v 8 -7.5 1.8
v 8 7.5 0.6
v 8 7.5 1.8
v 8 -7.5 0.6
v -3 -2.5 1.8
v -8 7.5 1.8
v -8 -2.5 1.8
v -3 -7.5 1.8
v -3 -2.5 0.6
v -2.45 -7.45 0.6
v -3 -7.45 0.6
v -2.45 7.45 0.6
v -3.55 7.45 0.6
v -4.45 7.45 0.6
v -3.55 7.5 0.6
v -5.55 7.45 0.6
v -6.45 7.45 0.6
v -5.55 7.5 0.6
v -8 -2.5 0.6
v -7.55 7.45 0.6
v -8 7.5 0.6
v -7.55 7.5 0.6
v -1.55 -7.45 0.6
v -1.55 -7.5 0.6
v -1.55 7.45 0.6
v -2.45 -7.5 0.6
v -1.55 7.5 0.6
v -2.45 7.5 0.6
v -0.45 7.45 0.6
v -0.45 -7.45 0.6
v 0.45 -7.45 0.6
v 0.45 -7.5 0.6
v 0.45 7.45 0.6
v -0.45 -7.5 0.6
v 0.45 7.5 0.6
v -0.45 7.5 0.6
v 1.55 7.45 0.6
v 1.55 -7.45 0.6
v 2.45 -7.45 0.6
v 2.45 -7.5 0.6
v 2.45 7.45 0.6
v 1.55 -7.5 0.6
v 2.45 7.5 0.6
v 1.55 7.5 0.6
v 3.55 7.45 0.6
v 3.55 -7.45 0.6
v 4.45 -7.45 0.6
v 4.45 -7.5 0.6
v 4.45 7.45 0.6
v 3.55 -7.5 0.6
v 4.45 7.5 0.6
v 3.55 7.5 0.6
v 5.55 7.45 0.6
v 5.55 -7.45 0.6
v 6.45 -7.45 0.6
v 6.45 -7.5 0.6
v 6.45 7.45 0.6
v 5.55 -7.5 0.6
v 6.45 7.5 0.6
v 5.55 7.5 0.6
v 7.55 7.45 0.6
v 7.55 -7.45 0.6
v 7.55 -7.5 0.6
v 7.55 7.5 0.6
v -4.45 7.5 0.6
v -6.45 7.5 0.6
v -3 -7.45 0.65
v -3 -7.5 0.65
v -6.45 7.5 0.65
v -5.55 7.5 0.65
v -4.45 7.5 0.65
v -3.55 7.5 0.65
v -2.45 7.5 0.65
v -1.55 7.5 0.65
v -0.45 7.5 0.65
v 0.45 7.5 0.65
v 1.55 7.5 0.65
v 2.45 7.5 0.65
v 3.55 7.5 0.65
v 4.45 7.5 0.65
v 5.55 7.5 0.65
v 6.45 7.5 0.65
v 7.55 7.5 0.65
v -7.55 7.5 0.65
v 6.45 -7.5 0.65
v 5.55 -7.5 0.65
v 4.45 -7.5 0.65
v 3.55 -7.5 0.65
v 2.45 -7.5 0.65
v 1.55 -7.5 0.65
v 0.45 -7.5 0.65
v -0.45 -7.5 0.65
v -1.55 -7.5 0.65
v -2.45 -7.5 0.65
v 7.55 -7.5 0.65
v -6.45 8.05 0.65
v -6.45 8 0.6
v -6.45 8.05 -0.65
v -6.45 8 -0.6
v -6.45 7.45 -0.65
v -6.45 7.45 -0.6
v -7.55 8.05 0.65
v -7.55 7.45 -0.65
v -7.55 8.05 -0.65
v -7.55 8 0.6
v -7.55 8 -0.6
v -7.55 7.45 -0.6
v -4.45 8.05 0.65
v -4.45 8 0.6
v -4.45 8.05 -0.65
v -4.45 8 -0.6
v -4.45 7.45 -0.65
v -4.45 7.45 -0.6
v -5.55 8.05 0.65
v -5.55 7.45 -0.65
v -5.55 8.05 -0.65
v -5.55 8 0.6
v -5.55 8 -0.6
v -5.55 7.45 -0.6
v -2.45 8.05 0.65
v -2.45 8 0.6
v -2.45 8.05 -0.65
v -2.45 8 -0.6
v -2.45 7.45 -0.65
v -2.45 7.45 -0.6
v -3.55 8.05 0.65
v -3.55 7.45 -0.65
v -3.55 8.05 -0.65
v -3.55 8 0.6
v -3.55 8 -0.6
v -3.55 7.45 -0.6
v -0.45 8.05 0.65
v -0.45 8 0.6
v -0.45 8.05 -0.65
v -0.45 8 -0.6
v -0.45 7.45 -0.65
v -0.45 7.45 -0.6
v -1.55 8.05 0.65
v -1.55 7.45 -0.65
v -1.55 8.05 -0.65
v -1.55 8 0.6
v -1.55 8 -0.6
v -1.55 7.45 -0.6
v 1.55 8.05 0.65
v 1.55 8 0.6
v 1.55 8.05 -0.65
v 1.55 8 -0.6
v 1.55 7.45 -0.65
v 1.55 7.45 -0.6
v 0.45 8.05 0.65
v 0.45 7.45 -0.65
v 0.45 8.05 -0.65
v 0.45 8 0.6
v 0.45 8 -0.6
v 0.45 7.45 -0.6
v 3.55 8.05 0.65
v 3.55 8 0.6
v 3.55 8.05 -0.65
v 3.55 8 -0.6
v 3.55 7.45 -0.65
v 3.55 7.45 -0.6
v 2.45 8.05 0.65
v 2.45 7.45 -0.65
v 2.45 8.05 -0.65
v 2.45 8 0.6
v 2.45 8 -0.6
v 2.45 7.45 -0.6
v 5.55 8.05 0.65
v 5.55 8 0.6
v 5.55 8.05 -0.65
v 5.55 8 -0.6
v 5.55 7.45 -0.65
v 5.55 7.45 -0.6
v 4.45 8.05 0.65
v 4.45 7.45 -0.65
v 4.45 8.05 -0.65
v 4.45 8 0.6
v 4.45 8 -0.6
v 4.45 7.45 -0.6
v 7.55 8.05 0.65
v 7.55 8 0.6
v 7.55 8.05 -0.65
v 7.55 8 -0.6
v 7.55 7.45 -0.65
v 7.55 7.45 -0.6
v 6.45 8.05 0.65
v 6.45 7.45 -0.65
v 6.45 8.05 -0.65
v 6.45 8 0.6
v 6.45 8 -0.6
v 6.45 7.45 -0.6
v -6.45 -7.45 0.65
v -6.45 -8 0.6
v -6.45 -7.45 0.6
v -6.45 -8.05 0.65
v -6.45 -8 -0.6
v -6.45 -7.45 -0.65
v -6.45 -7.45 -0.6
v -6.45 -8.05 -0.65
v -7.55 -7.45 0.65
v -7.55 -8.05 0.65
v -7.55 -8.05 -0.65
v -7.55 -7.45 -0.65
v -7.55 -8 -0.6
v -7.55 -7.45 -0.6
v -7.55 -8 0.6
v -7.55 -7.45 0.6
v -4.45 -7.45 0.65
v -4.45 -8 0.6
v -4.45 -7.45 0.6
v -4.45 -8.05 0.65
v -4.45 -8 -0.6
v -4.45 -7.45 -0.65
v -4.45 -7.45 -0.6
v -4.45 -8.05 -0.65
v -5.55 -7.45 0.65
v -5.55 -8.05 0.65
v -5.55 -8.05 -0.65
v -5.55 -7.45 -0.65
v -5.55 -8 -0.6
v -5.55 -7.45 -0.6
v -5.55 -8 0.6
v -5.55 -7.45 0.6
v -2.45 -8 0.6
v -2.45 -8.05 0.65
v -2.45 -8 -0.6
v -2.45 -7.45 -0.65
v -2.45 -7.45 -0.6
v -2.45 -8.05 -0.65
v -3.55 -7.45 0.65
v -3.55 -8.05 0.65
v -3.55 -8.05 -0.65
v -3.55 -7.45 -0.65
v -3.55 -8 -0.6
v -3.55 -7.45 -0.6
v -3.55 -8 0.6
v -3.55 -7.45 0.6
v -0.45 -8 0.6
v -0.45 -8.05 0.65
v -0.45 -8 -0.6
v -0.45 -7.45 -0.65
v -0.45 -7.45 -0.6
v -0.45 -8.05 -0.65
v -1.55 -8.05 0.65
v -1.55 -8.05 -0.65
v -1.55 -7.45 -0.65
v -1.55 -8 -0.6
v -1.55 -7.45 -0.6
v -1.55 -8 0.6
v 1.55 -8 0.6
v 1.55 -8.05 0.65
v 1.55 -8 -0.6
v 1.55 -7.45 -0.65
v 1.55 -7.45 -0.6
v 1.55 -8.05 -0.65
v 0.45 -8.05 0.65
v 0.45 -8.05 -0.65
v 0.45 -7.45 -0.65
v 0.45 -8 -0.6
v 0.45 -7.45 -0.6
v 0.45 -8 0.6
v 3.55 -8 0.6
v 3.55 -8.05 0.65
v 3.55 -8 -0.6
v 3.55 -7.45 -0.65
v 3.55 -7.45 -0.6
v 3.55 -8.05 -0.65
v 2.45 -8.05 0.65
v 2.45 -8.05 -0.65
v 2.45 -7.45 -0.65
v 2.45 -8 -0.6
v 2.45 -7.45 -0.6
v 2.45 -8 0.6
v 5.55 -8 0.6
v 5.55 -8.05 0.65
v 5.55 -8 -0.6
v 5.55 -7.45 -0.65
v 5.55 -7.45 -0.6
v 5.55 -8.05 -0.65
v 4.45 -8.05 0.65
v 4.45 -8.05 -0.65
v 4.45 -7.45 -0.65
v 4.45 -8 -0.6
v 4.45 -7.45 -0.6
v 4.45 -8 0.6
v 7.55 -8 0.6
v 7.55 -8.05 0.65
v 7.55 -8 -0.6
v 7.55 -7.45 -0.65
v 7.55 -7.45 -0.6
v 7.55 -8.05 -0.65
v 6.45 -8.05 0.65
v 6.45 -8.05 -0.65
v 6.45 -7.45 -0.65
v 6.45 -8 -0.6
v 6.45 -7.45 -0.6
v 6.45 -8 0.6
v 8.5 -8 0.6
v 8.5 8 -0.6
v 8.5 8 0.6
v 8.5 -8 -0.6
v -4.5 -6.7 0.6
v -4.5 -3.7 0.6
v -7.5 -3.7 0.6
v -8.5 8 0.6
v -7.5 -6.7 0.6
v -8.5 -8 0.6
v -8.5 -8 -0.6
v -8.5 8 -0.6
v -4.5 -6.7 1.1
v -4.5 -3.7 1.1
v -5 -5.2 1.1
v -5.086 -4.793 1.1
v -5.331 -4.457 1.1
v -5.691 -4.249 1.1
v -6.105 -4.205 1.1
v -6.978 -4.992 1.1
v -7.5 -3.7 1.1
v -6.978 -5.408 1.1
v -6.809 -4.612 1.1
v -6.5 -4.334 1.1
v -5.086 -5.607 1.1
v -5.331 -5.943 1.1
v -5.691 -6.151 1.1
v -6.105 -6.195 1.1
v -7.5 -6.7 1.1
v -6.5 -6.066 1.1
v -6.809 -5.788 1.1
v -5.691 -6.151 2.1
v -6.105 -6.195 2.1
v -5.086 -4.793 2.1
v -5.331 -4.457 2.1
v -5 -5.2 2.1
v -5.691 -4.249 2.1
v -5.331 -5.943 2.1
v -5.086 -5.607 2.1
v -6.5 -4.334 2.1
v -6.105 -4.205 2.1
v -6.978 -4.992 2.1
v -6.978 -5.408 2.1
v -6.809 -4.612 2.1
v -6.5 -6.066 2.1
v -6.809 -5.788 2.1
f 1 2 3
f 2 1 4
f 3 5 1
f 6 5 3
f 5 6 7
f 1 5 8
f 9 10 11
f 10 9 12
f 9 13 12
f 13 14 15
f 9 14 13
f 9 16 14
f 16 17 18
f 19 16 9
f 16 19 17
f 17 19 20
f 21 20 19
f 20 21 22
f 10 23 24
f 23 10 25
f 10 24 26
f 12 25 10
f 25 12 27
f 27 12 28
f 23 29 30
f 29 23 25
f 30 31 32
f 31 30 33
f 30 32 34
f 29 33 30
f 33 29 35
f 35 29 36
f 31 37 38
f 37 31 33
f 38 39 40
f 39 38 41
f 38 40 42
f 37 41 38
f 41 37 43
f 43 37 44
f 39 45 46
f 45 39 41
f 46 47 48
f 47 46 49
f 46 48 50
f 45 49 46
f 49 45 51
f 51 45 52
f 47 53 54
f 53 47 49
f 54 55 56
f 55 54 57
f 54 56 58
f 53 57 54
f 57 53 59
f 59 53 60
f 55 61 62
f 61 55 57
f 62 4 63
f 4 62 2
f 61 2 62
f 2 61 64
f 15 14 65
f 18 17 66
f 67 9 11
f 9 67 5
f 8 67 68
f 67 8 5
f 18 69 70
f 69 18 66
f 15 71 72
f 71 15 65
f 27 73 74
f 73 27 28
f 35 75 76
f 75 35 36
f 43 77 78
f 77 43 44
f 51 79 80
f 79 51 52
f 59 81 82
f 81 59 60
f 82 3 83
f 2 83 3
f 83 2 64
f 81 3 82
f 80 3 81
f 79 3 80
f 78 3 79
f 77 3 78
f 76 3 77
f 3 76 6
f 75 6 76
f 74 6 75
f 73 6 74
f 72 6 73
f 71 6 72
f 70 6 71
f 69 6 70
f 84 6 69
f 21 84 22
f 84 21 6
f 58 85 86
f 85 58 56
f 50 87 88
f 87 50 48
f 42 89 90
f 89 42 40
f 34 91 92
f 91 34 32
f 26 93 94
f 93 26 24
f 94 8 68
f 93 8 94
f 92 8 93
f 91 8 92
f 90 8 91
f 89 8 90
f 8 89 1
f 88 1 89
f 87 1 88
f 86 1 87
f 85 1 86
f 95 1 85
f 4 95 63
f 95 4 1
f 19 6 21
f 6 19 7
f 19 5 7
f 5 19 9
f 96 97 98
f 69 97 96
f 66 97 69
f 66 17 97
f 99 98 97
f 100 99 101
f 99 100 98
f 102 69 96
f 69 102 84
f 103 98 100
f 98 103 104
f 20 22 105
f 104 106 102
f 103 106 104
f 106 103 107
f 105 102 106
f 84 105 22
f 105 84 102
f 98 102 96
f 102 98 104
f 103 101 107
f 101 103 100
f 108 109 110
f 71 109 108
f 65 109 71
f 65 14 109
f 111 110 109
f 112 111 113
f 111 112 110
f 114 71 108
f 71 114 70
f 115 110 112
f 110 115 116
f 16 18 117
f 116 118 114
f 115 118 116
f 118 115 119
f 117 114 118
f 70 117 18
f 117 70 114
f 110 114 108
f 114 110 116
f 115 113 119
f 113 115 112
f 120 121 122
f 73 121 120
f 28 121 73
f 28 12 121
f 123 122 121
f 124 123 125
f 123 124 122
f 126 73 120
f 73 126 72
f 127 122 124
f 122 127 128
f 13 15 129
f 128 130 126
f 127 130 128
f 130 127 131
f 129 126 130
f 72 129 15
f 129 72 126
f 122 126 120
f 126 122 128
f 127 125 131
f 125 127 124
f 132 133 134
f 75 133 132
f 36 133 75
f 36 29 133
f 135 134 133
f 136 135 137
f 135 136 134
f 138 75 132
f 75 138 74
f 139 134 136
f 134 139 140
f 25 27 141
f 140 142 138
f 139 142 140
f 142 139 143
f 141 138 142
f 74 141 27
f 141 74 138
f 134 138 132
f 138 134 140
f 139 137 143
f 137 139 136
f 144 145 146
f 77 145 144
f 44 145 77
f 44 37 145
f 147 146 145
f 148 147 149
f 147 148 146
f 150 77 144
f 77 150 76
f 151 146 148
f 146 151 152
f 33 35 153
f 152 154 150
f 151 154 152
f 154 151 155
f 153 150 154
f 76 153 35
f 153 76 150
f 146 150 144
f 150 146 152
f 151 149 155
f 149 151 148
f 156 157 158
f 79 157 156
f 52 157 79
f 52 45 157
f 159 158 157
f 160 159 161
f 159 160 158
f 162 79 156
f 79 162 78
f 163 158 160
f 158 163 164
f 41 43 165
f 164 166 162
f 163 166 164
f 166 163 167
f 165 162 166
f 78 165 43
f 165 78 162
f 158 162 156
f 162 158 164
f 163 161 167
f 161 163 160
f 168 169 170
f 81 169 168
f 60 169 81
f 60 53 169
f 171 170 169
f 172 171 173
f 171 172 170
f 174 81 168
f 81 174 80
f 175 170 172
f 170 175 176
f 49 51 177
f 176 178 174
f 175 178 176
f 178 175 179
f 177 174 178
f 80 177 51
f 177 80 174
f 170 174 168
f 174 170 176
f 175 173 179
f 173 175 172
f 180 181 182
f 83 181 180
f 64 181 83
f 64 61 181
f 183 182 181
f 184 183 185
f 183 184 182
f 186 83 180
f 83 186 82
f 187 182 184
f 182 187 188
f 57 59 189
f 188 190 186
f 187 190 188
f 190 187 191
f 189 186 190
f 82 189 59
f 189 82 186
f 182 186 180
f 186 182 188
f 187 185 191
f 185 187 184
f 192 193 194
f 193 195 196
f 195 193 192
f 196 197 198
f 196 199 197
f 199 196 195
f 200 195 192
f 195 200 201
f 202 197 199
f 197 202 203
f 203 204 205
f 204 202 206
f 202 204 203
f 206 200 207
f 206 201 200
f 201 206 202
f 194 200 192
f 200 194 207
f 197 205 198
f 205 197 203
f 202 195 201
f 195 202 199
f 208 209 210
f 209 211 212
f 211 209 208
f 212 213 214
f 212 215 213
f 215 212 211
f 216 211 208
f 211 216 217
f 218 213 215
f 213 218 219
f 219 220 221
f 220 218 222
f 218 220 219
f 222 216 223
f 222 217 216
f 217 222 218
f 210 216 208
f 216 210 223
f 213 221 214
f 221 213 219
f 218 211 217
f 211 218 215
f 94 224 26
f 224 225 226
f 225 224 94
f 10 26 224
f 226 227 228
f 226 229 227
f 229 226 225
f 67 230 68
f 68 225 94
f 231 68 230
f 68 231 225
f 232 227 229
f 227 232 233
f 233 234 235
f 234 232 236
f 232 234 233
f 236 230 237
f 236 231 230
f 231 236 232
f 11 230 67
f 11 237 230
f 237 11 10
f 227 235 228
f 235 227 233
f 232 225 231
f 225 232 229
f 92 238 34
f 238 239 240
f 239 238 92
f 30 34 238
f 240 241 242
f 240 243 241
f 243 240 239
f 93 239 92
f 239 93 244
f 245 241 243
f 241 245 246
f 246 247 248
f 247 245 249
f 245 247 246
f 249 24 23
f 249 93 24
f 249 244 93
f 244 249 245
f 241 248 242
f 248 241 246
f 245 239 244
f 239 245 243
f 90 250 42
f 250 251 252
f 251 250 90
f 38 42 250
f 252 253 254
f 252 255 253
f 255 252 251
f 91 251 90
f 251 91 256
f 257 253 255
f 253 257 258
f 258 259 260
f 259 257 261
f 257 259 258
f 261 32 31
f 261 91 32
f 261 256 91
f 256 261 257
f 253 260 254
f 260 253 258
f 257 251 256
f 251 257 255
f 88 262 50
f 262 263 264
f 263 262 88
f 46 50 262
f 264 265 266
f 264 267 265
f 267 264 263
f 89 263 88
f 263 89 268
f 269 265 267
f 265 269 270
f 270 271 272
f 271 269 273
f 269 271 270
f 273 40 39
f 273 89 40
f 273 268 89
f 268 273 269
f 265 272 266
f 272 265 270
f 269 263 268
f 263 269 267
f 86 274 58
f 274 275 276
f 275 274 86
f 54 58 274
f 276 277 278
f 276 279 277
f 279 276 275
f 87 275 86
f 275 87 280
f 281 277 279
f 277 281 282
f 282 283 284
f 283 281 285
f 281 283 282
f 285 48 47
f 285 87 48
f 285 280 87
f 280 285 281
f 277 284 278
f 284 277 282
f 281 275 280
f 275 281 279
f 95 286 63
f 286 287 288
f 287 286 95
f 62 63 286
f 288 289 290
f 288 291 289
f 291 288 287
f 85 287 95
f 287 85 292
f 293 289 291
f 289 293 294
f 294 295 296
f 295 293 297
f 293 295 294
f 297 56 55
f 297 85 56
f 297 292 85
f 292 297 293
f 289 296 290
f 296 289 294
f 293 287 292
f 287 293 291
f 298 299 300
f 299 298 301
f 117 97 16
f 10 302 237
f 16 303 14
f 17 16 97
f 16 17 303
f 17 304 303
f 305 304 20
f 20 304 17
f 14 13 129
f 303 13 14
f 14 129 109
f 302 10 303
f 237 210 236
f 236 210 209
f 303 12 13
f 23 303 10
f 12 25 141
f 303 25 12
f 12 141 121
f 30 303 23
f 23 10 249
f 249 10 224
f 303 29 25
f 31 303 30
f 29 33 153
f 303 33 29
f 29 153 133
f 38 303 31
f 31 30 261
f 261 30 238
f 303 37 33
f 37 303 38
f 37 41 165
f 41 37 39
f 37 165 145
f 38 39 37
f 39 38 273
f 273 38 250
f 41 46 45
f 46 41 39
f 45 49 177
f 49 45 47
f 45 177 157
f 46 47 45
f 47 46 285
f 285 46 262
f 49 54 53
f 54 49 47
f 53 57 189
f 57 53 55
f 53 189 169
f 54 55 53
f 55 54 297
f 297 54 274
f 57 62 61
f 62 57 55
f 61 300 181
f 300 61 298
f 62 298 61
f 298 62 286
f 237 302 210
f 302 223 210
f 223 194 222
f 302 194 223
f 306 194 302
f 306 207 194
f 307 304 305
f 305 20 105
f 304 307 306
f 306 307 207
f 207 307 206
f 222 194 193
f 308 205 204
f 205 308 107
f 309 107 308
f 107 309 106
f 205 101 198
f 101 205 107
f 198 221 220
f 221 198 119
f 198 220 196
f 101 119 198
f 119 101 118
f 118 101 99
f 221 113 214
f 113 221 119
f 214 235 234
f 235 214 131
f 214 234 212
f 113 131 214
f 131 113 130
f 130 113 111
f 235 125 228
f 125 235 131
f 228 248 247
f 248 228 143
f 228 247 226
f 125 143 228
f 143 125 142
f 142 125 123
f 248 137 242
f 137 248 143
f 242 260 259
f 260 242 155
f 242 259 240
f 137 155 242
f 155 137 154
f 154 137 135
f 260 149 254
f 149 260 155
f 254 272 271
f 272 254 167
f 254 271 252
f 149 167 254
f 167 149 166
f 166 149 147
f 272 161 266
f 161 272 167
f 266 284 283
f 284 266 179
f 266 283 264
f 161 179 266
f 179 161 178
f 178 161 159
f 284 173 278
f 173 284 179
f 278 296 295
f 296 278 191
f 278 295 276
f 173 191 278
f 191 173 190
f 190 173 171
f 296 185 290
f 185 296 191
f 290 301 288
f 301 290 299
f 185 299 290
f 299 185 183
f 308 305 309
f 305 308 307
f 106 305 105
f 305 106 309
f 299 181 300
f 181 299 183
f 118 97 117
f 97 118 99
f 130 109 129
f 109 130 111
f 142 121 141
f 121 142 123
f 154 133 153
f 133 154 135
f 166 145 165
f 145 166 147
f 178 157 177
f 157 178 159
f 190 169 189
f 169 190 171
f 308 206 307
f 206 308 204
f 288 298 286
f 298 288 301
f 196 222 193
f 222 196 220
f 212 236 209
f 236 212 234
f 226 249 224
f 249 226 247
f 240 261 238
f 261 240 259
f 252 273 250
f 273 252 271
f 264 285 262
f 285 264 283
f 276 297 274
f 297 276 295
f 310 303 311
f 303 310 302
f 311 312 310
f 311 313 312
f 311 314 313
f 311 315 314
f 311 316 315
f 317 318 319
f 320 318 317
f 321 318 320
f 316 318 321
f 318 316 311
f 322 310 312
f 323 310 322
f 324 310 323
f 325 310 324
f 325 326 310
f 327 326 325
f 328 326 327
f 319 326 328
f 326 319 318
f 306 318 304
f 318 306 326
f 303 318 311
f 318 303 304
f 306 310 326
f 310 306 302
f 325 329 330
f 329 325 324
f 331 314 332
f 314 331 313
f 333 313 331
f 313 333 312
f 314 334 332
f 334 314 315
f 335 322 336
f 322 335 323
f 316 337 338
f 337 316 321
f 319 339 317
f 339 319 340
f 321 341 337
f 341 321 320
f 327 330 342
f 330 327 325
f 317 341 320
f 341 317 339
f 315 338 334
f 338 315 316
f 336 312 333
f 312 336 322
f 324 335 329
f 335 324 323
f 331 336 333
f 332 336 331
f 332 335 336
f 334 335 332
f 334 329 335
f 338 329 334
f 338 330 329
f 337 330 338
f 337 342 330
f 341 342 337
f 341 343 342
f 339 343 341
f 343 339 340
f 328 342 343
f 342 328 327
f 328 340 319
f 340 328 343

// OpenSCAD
color("black")cube([17,16,1.2],center=true);
color("gray")translate([0,0,1.2])union(){
    translate([2.5,0,0])cube([11,15,1.2],center=true);
    translate([0,2.5,0])cube([16,10,1.2],center=true);
}

color("gold")translate([-17/2+0.5,15.5/2,0])for(i=[1:2:16])translate([i,0,0])cube([1.1,0.6,1.3],true);

color("gold")translate([-17/2+0.5,-15.5/2,0])for(i=[1:2:16])translate([i,0,0])cube([1.1,0.6,1.3],true);

color("white")translate([-7.5,-6.7,0.6])cube([3,3,0.5]);
color("gold")translate([-6,-5.2,0.6])cylinder(d=2,h=1.5,$fn=15);
